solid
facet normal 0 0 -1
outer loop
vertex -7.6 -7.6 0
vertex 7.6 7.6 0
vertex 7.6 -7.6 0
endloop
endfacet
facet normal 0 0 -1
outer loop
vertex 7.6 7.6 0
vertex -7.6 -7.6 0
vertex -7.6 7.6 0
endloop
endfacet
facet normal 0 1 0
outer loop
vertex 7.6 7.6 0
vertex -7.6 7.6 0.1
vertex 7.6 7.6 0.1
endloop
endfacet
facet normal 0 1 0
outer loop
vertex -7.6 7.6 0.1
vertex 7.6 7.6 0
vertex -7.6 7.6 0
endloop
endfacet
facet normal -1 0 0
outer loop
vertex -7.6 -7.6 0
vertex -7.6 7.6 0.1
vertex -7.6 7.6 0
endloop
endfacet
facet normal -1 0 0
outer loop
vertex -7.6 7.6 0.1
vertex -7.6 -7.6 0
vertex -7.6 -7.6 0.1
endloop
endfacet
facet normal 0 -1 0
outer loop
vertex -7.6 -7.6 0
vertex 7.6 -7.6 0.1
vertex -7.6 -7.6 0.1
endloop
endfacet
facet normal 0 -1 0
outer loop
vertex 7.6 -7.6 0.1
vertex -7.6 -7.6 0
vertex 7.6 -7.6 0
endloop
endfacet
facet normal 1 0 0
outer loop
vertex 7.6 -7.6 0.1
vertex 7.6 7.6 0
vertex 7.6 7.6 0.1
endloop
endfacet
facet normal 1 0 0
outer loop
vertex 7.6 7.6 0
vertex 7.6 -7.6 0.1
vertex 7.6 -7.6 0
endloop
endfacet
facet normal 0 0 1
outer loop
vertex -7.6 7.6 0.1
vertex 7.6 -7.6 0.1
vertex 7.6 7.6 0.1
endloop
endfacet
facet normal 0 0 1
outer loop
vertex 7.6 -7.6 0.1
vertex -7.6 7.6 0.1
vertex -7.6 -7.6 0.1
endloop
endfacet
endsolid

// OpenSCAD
// file: ../p/box5-12.scad
use <../lib.scad>
function ldraw_lib__box5_12() = [
// 0 Box with 5 Faces without Any Edges
// 0 Name: box5-12.dat
// 0 Author: Chris Dee [cwdee]
// 0 !LDRAW_ORG Primitive UPDATE 2009-02
// 0 !LICENSE Licensed under CC BY 4.0 : see CAreadme.txt
// 
// 0 BFC CERTIFY CCW
  [0,"BFC","CERTIFY"],
  [0,"BFC","CCW"],
// 
// 0 !HISTORY 2009-09-03 [PTadmin] Official Update 2009-02
// 
// 
// 4 16 1 1 1 1 1 -1 -1 1 -1 -1 1 1
  [4,16,1,1,1,1,1,-1,-1,1,-1,-1,1,1],
// 4 16 -1 0 1 1 0 1 1 1 1 -1 1 1
  [4,16,-1,0,1,1,0,1,1,1,1,-1,1,1],
// 4 16 -1 0 -1 -1 0 1 -1 1 1 -1 1 -1
  [4,16,-1,0,-1,-1,0,1,-1,1,1,-1,1,-1],
// 4 16 1 0 -1 -1 0 -1 -1 1 -1 1 1 -1
  [4,16,1,0,-1,-1,0,-1,-1,1,-1,1,1,-1],
// 4 16 1 0 1 1 0 -1 1 1 -1 1 1 1
  [4,16,1,0,1,1,0,-1,1,1,-1,1,1,1],
// 0
];
module ldraw_lib__box5_12(step=0, col=false, unit=2/5, alt=false, line=0.2, solid=!$preview)
    makepoly(ldraw_lib__box5_12(), step=step, col=col, unit=unit, alt=alt, line=line, solid=solid);
ldraw_lib__box5_12(line=0.2);
// main file
use <../lib.scad>
use <../p/box5-12.scad>
function ldraw_lib__4620858b() = [
// 0 Sticker  1.9 x  1.9 with Chrome Silver Mirror
// 0 Name: 4620858b.dat
// 0 Author: Takeshi Takahashi [RainbowDolphin]
// 0 !LDRAW_ORG Part UPDATE 2024-05
// 0 !LICENSE Licensed under CC BY 4.0 : see CAreadme.txt
// 
// 0 BFC CERTIFY CCW
  [0,"BFC","CERTIFY"],
  [0,"BFC","CCW"],
// 
// 0 !KEYWORDS Beauty Shop, Cosmetics, set 3187
// 
// 0 !HISTORY 2024-06-30 [OrionP] Official Update 2024-05
// 
// 
// 1 16 0 -0.25 0 19 0 0 0 0.25 0 0 0 19 box5-12.dat
  [1,16,0,-0.25,0,19,0,0,0,0.25,0,0,0,19, ldraw_lib__box5_12()],
// 
// 4 383 19 -0.25 19 -19 -0.25 19 -19 -0.25 -19 19 -0.25 -19
  [4,383,19,-0.25,19,-19,-0.25,19,-19,-0.25,-19,19,-0.25,-19],
];
module ldraw_lib__4620858b(step=0, col=false, unit=2/5, alt=false, line=0.2, solid=!$preview)
    makepoly(ldraw_lib__4620858b(), step=step, col=col, unit=unit, alt=alt, line=line, solid=solid);
ldraw_lib__4620858b(line=0.2);
